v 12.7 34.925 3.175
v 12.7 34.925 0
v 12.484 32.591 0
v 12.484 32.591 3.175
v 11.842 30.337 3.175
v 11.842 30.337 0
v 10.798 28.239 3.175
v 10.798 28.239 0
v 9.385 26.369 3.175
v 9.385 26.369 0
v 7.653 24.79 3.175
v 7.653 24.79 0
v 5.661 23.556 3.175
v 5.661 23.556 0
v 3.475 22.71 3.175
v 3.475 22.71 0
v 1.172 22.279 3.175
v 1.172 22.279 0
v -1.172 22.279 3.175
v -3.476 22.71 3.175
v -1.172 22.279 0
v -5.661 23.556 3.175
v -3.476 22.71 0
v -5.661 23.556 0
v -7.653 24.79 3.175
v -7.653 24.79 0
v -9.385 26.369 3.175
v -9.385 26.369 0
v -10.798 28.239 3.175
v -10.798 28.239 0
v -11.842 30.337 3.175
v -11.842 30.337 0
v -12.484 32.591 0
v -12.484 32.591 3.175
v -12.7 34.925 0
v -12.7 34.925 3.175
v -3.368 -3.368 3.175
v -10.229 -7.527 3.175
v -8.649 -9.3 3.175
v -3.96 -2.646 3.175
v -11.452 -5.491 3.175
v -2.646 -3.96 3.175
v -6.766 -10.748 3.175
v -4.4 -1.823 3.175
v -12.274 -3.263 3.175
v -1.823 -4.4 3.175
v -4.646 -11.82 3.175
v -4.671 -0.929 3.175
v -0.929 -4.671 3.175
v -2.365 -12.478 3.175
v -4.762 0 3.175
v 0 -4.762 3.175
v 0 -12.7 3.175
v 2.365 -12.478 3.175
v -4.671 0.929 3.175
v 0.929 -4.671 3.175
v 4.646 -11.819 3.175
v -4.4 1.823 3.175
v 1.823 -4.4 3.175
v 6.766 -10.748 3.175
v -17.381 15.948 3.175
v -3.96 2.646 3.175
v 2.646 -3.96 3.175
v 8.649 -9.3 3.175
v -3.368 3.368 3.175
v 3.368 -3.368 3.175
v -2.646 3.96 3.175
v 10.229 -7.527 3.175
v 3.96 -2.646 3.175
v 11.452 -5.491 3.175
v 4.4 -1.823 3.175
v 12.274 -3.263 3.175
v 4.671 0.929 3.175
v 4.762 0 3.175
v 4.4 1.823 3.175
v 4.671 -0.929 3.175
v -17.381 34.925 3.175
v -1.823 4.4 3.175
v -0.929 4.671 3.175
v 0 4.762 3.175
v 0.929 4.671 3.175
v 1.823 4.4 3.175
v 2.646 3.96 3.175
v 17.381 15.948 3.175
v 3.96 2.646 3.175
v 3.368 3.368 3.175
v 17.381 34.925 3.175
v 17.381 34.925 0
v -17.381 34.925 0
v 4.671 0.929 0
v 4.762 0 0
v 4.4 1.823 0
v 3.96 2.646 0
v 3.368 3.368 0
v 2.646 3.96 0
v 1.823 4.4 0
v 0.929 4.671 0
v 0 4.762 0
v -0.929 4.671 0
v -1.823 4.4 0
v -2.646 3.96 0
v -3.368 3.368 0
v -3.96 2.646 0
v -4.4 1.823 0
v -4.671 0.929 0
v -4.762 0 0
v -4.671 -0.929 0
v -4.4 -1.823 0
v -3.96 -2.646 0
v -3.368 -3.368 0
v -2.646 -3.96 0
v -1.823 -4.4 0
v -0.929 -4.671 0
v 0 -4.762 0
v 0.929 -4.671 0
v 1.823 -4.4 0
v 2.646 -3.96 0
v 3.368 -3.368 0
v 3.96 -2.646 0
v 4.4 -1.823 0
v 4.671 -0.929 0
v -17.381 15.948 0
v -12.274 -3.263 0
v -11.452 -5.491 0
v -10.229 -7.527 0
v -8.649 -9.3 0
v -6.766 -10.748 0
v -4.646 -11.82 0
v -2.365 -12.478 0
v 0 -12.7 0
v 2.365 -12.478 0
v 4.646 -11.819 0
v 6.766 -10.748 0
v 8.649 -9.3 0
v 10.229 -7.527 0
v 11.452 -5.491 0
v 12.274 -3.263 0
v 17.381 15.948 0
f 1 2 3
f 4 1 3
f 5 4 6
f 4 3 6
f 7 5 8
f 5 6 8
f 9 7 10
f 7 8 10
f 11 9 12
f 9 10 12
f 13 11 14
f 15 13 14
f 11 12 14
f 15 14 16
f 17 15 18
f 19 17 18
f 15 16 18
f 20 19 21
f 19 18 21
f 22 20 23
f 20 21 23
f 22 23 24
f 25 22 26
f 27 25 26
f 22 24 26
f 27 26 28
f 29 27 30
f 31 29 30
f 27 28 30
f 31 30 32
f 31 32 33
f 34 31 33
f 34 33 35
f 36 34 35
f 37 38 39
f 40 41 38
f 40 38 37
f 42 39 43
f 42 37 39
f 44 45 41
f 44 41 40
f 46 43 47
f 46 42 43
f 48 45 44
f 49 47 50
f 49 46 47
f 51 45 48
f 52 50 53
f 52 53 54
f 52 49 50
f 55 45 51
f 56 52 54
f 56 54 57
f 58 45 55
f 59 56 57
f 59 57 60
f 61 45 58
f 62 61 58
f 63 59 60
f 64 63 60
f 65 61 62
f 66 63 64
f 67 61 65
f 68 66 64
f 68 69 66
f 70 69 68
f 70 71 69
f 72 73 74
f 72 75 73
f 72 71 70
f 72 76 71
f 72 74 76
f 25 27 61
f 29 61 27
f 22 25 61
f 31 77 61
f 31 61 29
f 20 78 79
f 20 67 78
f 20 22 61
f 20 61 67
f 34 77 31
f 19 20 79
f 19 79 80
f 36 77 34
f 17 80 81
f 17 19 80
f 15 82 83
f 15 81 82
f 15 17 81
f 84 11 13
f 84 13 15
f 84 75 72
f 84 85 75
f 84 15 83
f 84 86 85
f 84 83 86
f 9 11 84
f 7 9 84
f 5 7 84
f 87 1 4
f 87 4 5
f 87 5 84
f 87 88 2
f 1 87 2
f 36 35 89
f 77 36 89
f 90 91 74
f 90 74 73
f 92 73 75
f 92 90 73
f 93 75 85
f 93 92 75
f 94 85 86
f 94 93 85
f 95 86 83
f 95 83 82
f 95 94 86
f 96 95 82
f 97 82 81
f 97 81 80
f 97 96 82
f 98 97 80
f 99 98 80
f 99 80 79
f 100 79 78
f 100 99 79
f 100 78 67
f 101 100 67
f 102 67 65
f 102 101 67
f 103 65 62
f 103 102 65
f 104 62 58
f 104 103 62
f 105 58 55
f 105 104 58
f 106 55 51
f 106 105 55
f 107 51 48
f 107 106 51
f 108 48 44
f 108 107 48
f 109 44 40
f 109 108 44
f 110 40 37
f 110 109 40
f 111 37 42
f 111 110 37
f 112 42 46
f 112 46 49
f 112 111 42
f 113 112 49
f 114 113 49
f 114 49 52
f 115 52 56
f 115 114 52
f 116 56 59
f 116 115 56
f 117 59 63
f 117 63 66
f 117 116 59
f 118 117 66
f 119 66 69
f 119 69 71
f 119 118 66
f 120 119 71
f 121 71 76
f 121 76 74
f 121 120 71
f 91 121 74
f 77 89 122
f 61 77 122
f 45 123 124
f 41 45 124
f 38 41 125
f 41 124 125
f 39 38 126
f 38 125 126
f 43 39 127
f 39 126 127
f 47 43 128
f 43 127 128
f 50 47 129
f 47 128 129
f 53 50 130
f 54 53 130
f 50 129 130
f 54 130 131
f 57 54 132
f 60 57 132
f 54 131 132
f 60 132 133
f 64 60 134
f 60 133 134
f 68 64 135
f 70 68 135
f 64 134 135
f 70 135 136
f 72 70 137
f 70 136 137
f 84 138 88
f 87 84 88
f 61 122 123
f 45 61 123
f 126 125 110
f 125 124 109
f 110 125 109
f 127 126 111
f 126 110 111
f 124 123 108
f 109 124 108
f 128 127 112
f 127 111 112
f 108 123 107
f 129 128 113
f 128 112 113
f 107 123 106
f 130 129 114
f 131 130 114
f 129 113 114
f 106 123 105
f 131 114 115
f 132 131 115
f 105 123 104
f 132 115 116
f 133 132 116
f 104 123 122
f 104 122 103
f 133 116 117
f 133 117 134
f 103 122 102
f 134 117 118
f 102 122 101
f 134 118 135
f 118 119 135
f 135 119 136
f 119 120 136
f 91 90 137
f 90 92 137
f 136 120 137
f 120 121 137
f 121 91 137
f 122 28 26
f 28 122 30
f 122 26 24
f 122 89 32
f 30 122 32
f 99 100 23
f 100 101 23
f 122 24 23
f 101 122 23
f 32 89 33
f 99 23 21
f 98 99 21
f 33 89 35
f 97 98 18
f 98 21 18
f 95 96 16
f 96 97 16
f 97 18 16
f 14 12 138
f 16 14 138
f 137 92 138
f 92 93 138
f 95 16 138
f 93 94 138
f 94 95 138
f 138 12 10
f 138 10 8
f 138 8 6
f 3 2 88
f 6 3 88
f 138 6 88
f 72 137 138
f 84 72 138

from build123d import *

# Parameters (mm, degrees)
SKETCH1_R           = 12.7
SKETCH1_R_2         = 4.7625
BOSS_EXTRUDE1_DEPTH = 3.175


with BuildPart() as part:
    # Sketch1 → Boss-Extrude1 (new body)
    with BuildSketch(Plane.XY):
        with BuildLine():
            Line((-12.70002942, 34.924992178), (-17.381139802, 34.924992178))
            Line((-17.381139802, 34.924992178), (-17.381139802, 15.948235146))
            Line((-17.381139802, 15.948235146), (-12.273648862, -3.263057403))
            ThreePointArc((-12.273648862, -3.263057403), (-1.645396526, 12.59296114), (12.7, 0))
            ThreePointArc((12.7, 0), (12.592963493, -1.645378514), (12.273658196, -3.263022292))
            Line((12.273658196, -3.263022292), (17.381080961, 15.948235146))
            Line((17.381080961, 15.948235146), (17.381080961, 34.924992178))
            Line((17.381080961, 34.924992178), (12.69997058, 34.924992178))
            ThreePointArc((12.69997058, 34.924992178), (-2.942e-05, 22.224992178), (-12.70002942, 34.924992178))
        make_face()
        Circle(SKETCH1_R)
        Circle(SKETCH1_R_2, mode=Mode.SUBTRACT)
    extrude(amount=BOSS_EXTRUDE1_DEPTH)


solid = part.part
